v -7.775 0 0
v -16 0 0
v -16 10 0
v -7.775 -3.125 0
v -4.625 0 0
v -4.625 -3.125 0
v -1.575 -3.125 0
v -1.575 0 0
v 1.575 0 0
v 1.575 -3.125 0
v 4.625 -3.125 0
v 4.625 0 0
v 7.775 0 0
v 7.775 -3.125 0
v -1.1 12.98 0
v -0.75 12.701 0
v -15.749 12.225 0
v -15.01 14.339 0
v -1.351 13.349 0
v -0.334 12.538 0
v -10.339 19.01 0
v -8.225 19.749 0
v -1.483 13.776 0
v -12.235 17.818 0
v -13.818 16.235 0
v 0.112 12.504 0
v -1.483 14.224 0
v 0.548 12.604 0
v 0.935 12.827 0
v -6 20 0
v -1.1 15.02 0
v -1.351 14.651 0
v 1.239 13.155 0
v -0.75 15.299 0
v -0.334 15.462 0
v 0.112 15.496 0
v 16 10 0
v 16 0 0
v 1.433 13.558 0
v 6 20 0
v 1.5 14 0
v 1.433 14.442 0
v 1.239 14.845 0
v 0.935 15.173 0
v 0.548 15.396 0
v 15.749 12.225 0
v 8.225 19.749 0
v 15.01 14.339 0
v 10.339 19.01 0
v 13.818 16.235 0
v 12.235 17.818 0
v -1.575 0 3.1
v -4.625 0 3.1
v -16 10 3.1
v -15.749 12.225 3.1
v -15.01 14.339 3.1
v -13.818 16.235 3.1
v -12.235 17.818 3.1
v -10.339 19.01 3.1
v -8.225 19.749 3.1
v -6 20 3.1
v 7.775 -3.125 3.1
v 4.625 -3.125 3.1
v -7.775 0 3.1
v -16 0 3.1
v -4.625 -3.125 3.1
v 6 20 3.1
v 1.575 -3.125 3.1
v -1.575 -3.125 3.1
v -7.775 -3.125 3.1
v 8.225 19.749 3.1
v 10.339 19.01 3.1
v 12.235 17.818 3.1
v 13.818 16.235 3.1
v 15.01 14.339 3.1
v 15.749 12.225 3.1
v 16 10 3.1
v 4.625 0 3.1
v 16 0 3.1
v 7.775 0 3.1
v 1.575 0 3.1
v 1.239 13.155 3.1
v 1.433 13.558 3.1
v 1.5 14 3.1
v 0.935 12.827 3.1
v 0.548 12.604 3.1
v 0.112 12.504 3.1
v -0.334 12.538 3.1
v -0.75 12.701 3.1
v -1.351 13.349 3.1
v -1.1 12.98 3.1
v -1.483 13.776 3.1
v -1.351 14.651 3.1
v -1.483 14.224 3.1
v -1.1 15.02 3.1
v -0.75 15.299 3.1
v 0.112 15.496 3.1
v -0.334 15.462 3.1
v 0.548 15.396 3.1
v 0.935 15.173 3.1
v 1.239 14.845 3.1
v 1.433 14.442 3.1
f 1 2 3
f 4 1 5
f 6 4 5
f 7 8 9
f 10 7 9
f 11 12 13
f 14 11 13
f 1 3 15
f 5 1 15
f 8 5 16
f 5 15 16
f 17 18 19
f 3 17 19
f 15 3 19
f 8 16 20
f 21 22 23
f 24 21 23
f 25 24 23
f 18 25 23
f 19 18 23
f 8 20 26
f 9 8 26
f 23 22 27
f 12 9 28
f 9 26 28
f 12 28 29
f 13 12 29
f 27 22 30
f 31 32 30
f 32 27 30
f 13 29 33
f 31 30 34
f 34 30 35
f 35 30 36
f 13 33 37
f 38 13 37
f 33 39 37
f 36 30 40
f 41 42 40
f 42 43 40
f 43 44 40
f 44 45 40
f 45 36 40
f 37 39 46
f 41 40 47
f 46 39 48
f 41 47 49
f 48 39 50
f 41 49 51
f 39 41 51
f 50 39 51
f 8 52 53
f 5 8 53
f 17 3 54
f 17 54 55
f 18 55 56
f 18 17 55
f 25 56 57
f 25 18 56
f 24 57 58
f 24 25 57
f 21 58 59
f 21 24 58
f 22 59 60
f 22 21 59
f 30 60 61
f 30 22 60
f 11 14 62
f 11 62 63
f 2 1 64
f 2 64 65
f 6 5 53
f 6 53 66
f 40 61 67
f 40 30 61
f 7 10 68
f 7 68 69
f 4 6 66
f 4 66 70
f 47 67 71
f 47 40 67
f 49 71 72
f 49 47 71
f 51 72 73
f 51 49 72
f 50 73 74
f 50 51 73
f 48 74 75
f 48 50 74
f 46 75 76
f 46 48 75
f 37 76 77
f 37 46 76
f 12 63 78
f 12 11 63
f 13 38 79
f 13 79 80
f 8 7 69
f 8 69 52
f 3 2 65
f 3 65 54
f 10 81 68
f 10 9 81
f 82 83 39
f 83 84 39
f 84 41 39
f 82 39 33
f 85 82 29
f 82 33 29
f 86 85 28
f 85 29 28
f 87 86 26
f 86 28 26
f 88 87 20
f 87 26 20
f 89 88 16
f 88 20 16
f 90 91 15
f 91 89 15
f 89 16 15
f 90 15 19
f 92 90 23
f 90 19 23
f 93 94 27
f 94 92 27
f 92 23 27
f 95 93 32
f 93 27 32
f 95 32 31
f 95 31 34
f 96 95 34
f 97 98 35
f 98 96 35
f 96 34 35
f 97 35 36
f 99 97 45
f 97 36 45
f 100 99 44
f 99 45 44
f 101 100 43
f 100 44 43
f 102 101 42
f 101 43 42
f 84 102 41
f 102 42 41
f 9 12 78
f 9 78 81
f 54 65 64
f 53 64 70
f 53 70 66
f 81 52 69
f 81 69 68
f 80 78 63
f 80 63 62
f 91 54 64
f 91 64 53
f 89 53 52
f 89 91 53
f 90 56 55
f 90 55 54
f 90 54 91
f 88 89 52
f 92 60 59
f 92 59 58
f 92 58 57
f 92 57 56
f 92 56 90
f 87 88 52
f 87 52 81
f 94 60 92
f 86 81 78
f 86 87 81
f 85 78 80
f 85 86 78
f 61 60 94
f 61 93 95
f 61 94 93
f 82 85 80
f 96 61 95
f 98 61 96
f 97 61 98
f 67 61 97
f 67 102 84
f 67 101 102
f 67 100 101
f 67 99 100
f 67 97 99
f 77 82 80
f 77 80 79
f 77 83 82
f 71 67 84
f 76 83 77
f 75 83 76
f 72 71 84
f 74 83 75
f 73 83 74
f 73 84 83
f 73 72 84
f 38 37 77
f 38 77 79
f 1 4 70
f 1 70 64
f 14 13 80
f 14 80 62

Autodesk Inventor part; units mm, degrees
ref_plane "YZ Plane" through (0, 0, 0) normal (1, 0, 0) x (0, 1, 0)
ref_plane "XZ Plane" through (0, 0, 0) normal (0, 1, 0) x (-1, 0, 0)
ref_plane "XY Plane" through (0, 0, 0) normal (0, 0, 1) x (1, 0, 0)
sketch "tabs" plane through (0, 0, 0) normal (0, 0, 1) x (1, 0, 0)
  line L0 (15.6175, 13.9118) -> (18.7675, 13.9118)
  line L1 (18.7675, 13.9118) -> (18.7675, 10.7868)
  line L2 (18.7675, 10.7868) -> (15.6175, 10.7868)
  line L3 (15.6175, 10.7868) -> (15.6175, 13.9118)
  line L4 (21.8175, 13.9118) -> (24.9675, 13.9118)
  line L5 (24.9675, 13.9118) -> (24.9675, 10.7868)
  line L6 (24.9675, 10.7868) -> (21.8175, 10.7868)
  line L7 (21.8175, 10.7868) -> (21.8175, 13.9118)
  line L8 (28.0175, 13.9118) -> (31.1675, 13.9118)
  line L9 (31.1675, 13.9118) -> (31.1675, 10.7868)
  line L10 (31.1675, 10.7868) -> (28.0175, 10.7868)
  line L11 (28.0175, 10.7868) -> (28.0175, 13.9118)
  line L12 (23.3925, 10.7868) -> (23.3925, 8.8536) construction
  point P0 (23.3925, 12.1901)
  dimension "d2" = 3.15
  dimension "d3" = 3.05
  dimension "d4" = 3.05
  dimension "d5" = 3.125
sketch "Sketch1" plane through (0, 0, 0) normal (0, 0, 1) x (1, 0, 0)
  line L0 (-6, 20) -> (6, 20)
  line L1 (16, 10) -> (16, 0)
  line L2 (16, 0) -> (-16, 0)
  line L3 (-16, 0) -> (-16, 10)
  line L4 (0, 16.9043) -> (0, -20.0235) construction
  line L5 (-32.3473, 0) -> (40.4078, 0) construction
  arc A0 (-6, 20) -> (-16, 10) centre (-6, 10) ccw
  arc A1 (16, 10) -> (6, 20) centre (6, 10) ccw
  circle A2 centre (0, 14) radius 1.5
  line L6 (-7.775, 0) -> (-4.625, 0)
  line L7 (-4.625, 0) -> (-4.625, -3.125)
  line L8 (-4.625, -3.125) -> (-7.775, -3.125)
  line L9 (-7.775, -3.125) -> (-7.775, 0)
  line L10 (-1.575, 0) -> (1.575, 0)
  line L11 (1.575, 0) -> (1.575, -3.125)
  line L12 (1.575, -3.125) -> (-1.575, -3.125)
  line L13 (-1.575, -3.125) -> (-1.575, 0)
  line L14 (4.625, 0) -> (7.775, 0)
  line L15 (7.775, 0) -> (7.775, -3.125)
  line L16 (7.775, -3.125) -> (4.625, -3.125)
  line L17 (4.625, -3.125) -> (4.625, 0)
  line L18 (0, -3.125) -> (0, -5.0582) construction
  point P0 (0, 0)
  point P1 (0, 20)
  point P2 (16, 5)
  dimension "d0" = 32
  dimension "d6" = 20
  dimension "d7" = 10
  dimension "d8" = 3
  dimension "d9" = 6
extrude "Extrusion1" add sketch "Sketch1" along normal blind 3.1
equation "\"d2\" = mat + kerf"
equation "\"d3\" = mat - kerf"
equation "\"d4\" = mat - kerf"
equation "\"d5\" = mat + 0.5 * kerf"
equation "\"d10\" = mat"
equation "\"mat\" = 3.1"
equation "\"kerf\" = 0.05"
properties part number "link1"
